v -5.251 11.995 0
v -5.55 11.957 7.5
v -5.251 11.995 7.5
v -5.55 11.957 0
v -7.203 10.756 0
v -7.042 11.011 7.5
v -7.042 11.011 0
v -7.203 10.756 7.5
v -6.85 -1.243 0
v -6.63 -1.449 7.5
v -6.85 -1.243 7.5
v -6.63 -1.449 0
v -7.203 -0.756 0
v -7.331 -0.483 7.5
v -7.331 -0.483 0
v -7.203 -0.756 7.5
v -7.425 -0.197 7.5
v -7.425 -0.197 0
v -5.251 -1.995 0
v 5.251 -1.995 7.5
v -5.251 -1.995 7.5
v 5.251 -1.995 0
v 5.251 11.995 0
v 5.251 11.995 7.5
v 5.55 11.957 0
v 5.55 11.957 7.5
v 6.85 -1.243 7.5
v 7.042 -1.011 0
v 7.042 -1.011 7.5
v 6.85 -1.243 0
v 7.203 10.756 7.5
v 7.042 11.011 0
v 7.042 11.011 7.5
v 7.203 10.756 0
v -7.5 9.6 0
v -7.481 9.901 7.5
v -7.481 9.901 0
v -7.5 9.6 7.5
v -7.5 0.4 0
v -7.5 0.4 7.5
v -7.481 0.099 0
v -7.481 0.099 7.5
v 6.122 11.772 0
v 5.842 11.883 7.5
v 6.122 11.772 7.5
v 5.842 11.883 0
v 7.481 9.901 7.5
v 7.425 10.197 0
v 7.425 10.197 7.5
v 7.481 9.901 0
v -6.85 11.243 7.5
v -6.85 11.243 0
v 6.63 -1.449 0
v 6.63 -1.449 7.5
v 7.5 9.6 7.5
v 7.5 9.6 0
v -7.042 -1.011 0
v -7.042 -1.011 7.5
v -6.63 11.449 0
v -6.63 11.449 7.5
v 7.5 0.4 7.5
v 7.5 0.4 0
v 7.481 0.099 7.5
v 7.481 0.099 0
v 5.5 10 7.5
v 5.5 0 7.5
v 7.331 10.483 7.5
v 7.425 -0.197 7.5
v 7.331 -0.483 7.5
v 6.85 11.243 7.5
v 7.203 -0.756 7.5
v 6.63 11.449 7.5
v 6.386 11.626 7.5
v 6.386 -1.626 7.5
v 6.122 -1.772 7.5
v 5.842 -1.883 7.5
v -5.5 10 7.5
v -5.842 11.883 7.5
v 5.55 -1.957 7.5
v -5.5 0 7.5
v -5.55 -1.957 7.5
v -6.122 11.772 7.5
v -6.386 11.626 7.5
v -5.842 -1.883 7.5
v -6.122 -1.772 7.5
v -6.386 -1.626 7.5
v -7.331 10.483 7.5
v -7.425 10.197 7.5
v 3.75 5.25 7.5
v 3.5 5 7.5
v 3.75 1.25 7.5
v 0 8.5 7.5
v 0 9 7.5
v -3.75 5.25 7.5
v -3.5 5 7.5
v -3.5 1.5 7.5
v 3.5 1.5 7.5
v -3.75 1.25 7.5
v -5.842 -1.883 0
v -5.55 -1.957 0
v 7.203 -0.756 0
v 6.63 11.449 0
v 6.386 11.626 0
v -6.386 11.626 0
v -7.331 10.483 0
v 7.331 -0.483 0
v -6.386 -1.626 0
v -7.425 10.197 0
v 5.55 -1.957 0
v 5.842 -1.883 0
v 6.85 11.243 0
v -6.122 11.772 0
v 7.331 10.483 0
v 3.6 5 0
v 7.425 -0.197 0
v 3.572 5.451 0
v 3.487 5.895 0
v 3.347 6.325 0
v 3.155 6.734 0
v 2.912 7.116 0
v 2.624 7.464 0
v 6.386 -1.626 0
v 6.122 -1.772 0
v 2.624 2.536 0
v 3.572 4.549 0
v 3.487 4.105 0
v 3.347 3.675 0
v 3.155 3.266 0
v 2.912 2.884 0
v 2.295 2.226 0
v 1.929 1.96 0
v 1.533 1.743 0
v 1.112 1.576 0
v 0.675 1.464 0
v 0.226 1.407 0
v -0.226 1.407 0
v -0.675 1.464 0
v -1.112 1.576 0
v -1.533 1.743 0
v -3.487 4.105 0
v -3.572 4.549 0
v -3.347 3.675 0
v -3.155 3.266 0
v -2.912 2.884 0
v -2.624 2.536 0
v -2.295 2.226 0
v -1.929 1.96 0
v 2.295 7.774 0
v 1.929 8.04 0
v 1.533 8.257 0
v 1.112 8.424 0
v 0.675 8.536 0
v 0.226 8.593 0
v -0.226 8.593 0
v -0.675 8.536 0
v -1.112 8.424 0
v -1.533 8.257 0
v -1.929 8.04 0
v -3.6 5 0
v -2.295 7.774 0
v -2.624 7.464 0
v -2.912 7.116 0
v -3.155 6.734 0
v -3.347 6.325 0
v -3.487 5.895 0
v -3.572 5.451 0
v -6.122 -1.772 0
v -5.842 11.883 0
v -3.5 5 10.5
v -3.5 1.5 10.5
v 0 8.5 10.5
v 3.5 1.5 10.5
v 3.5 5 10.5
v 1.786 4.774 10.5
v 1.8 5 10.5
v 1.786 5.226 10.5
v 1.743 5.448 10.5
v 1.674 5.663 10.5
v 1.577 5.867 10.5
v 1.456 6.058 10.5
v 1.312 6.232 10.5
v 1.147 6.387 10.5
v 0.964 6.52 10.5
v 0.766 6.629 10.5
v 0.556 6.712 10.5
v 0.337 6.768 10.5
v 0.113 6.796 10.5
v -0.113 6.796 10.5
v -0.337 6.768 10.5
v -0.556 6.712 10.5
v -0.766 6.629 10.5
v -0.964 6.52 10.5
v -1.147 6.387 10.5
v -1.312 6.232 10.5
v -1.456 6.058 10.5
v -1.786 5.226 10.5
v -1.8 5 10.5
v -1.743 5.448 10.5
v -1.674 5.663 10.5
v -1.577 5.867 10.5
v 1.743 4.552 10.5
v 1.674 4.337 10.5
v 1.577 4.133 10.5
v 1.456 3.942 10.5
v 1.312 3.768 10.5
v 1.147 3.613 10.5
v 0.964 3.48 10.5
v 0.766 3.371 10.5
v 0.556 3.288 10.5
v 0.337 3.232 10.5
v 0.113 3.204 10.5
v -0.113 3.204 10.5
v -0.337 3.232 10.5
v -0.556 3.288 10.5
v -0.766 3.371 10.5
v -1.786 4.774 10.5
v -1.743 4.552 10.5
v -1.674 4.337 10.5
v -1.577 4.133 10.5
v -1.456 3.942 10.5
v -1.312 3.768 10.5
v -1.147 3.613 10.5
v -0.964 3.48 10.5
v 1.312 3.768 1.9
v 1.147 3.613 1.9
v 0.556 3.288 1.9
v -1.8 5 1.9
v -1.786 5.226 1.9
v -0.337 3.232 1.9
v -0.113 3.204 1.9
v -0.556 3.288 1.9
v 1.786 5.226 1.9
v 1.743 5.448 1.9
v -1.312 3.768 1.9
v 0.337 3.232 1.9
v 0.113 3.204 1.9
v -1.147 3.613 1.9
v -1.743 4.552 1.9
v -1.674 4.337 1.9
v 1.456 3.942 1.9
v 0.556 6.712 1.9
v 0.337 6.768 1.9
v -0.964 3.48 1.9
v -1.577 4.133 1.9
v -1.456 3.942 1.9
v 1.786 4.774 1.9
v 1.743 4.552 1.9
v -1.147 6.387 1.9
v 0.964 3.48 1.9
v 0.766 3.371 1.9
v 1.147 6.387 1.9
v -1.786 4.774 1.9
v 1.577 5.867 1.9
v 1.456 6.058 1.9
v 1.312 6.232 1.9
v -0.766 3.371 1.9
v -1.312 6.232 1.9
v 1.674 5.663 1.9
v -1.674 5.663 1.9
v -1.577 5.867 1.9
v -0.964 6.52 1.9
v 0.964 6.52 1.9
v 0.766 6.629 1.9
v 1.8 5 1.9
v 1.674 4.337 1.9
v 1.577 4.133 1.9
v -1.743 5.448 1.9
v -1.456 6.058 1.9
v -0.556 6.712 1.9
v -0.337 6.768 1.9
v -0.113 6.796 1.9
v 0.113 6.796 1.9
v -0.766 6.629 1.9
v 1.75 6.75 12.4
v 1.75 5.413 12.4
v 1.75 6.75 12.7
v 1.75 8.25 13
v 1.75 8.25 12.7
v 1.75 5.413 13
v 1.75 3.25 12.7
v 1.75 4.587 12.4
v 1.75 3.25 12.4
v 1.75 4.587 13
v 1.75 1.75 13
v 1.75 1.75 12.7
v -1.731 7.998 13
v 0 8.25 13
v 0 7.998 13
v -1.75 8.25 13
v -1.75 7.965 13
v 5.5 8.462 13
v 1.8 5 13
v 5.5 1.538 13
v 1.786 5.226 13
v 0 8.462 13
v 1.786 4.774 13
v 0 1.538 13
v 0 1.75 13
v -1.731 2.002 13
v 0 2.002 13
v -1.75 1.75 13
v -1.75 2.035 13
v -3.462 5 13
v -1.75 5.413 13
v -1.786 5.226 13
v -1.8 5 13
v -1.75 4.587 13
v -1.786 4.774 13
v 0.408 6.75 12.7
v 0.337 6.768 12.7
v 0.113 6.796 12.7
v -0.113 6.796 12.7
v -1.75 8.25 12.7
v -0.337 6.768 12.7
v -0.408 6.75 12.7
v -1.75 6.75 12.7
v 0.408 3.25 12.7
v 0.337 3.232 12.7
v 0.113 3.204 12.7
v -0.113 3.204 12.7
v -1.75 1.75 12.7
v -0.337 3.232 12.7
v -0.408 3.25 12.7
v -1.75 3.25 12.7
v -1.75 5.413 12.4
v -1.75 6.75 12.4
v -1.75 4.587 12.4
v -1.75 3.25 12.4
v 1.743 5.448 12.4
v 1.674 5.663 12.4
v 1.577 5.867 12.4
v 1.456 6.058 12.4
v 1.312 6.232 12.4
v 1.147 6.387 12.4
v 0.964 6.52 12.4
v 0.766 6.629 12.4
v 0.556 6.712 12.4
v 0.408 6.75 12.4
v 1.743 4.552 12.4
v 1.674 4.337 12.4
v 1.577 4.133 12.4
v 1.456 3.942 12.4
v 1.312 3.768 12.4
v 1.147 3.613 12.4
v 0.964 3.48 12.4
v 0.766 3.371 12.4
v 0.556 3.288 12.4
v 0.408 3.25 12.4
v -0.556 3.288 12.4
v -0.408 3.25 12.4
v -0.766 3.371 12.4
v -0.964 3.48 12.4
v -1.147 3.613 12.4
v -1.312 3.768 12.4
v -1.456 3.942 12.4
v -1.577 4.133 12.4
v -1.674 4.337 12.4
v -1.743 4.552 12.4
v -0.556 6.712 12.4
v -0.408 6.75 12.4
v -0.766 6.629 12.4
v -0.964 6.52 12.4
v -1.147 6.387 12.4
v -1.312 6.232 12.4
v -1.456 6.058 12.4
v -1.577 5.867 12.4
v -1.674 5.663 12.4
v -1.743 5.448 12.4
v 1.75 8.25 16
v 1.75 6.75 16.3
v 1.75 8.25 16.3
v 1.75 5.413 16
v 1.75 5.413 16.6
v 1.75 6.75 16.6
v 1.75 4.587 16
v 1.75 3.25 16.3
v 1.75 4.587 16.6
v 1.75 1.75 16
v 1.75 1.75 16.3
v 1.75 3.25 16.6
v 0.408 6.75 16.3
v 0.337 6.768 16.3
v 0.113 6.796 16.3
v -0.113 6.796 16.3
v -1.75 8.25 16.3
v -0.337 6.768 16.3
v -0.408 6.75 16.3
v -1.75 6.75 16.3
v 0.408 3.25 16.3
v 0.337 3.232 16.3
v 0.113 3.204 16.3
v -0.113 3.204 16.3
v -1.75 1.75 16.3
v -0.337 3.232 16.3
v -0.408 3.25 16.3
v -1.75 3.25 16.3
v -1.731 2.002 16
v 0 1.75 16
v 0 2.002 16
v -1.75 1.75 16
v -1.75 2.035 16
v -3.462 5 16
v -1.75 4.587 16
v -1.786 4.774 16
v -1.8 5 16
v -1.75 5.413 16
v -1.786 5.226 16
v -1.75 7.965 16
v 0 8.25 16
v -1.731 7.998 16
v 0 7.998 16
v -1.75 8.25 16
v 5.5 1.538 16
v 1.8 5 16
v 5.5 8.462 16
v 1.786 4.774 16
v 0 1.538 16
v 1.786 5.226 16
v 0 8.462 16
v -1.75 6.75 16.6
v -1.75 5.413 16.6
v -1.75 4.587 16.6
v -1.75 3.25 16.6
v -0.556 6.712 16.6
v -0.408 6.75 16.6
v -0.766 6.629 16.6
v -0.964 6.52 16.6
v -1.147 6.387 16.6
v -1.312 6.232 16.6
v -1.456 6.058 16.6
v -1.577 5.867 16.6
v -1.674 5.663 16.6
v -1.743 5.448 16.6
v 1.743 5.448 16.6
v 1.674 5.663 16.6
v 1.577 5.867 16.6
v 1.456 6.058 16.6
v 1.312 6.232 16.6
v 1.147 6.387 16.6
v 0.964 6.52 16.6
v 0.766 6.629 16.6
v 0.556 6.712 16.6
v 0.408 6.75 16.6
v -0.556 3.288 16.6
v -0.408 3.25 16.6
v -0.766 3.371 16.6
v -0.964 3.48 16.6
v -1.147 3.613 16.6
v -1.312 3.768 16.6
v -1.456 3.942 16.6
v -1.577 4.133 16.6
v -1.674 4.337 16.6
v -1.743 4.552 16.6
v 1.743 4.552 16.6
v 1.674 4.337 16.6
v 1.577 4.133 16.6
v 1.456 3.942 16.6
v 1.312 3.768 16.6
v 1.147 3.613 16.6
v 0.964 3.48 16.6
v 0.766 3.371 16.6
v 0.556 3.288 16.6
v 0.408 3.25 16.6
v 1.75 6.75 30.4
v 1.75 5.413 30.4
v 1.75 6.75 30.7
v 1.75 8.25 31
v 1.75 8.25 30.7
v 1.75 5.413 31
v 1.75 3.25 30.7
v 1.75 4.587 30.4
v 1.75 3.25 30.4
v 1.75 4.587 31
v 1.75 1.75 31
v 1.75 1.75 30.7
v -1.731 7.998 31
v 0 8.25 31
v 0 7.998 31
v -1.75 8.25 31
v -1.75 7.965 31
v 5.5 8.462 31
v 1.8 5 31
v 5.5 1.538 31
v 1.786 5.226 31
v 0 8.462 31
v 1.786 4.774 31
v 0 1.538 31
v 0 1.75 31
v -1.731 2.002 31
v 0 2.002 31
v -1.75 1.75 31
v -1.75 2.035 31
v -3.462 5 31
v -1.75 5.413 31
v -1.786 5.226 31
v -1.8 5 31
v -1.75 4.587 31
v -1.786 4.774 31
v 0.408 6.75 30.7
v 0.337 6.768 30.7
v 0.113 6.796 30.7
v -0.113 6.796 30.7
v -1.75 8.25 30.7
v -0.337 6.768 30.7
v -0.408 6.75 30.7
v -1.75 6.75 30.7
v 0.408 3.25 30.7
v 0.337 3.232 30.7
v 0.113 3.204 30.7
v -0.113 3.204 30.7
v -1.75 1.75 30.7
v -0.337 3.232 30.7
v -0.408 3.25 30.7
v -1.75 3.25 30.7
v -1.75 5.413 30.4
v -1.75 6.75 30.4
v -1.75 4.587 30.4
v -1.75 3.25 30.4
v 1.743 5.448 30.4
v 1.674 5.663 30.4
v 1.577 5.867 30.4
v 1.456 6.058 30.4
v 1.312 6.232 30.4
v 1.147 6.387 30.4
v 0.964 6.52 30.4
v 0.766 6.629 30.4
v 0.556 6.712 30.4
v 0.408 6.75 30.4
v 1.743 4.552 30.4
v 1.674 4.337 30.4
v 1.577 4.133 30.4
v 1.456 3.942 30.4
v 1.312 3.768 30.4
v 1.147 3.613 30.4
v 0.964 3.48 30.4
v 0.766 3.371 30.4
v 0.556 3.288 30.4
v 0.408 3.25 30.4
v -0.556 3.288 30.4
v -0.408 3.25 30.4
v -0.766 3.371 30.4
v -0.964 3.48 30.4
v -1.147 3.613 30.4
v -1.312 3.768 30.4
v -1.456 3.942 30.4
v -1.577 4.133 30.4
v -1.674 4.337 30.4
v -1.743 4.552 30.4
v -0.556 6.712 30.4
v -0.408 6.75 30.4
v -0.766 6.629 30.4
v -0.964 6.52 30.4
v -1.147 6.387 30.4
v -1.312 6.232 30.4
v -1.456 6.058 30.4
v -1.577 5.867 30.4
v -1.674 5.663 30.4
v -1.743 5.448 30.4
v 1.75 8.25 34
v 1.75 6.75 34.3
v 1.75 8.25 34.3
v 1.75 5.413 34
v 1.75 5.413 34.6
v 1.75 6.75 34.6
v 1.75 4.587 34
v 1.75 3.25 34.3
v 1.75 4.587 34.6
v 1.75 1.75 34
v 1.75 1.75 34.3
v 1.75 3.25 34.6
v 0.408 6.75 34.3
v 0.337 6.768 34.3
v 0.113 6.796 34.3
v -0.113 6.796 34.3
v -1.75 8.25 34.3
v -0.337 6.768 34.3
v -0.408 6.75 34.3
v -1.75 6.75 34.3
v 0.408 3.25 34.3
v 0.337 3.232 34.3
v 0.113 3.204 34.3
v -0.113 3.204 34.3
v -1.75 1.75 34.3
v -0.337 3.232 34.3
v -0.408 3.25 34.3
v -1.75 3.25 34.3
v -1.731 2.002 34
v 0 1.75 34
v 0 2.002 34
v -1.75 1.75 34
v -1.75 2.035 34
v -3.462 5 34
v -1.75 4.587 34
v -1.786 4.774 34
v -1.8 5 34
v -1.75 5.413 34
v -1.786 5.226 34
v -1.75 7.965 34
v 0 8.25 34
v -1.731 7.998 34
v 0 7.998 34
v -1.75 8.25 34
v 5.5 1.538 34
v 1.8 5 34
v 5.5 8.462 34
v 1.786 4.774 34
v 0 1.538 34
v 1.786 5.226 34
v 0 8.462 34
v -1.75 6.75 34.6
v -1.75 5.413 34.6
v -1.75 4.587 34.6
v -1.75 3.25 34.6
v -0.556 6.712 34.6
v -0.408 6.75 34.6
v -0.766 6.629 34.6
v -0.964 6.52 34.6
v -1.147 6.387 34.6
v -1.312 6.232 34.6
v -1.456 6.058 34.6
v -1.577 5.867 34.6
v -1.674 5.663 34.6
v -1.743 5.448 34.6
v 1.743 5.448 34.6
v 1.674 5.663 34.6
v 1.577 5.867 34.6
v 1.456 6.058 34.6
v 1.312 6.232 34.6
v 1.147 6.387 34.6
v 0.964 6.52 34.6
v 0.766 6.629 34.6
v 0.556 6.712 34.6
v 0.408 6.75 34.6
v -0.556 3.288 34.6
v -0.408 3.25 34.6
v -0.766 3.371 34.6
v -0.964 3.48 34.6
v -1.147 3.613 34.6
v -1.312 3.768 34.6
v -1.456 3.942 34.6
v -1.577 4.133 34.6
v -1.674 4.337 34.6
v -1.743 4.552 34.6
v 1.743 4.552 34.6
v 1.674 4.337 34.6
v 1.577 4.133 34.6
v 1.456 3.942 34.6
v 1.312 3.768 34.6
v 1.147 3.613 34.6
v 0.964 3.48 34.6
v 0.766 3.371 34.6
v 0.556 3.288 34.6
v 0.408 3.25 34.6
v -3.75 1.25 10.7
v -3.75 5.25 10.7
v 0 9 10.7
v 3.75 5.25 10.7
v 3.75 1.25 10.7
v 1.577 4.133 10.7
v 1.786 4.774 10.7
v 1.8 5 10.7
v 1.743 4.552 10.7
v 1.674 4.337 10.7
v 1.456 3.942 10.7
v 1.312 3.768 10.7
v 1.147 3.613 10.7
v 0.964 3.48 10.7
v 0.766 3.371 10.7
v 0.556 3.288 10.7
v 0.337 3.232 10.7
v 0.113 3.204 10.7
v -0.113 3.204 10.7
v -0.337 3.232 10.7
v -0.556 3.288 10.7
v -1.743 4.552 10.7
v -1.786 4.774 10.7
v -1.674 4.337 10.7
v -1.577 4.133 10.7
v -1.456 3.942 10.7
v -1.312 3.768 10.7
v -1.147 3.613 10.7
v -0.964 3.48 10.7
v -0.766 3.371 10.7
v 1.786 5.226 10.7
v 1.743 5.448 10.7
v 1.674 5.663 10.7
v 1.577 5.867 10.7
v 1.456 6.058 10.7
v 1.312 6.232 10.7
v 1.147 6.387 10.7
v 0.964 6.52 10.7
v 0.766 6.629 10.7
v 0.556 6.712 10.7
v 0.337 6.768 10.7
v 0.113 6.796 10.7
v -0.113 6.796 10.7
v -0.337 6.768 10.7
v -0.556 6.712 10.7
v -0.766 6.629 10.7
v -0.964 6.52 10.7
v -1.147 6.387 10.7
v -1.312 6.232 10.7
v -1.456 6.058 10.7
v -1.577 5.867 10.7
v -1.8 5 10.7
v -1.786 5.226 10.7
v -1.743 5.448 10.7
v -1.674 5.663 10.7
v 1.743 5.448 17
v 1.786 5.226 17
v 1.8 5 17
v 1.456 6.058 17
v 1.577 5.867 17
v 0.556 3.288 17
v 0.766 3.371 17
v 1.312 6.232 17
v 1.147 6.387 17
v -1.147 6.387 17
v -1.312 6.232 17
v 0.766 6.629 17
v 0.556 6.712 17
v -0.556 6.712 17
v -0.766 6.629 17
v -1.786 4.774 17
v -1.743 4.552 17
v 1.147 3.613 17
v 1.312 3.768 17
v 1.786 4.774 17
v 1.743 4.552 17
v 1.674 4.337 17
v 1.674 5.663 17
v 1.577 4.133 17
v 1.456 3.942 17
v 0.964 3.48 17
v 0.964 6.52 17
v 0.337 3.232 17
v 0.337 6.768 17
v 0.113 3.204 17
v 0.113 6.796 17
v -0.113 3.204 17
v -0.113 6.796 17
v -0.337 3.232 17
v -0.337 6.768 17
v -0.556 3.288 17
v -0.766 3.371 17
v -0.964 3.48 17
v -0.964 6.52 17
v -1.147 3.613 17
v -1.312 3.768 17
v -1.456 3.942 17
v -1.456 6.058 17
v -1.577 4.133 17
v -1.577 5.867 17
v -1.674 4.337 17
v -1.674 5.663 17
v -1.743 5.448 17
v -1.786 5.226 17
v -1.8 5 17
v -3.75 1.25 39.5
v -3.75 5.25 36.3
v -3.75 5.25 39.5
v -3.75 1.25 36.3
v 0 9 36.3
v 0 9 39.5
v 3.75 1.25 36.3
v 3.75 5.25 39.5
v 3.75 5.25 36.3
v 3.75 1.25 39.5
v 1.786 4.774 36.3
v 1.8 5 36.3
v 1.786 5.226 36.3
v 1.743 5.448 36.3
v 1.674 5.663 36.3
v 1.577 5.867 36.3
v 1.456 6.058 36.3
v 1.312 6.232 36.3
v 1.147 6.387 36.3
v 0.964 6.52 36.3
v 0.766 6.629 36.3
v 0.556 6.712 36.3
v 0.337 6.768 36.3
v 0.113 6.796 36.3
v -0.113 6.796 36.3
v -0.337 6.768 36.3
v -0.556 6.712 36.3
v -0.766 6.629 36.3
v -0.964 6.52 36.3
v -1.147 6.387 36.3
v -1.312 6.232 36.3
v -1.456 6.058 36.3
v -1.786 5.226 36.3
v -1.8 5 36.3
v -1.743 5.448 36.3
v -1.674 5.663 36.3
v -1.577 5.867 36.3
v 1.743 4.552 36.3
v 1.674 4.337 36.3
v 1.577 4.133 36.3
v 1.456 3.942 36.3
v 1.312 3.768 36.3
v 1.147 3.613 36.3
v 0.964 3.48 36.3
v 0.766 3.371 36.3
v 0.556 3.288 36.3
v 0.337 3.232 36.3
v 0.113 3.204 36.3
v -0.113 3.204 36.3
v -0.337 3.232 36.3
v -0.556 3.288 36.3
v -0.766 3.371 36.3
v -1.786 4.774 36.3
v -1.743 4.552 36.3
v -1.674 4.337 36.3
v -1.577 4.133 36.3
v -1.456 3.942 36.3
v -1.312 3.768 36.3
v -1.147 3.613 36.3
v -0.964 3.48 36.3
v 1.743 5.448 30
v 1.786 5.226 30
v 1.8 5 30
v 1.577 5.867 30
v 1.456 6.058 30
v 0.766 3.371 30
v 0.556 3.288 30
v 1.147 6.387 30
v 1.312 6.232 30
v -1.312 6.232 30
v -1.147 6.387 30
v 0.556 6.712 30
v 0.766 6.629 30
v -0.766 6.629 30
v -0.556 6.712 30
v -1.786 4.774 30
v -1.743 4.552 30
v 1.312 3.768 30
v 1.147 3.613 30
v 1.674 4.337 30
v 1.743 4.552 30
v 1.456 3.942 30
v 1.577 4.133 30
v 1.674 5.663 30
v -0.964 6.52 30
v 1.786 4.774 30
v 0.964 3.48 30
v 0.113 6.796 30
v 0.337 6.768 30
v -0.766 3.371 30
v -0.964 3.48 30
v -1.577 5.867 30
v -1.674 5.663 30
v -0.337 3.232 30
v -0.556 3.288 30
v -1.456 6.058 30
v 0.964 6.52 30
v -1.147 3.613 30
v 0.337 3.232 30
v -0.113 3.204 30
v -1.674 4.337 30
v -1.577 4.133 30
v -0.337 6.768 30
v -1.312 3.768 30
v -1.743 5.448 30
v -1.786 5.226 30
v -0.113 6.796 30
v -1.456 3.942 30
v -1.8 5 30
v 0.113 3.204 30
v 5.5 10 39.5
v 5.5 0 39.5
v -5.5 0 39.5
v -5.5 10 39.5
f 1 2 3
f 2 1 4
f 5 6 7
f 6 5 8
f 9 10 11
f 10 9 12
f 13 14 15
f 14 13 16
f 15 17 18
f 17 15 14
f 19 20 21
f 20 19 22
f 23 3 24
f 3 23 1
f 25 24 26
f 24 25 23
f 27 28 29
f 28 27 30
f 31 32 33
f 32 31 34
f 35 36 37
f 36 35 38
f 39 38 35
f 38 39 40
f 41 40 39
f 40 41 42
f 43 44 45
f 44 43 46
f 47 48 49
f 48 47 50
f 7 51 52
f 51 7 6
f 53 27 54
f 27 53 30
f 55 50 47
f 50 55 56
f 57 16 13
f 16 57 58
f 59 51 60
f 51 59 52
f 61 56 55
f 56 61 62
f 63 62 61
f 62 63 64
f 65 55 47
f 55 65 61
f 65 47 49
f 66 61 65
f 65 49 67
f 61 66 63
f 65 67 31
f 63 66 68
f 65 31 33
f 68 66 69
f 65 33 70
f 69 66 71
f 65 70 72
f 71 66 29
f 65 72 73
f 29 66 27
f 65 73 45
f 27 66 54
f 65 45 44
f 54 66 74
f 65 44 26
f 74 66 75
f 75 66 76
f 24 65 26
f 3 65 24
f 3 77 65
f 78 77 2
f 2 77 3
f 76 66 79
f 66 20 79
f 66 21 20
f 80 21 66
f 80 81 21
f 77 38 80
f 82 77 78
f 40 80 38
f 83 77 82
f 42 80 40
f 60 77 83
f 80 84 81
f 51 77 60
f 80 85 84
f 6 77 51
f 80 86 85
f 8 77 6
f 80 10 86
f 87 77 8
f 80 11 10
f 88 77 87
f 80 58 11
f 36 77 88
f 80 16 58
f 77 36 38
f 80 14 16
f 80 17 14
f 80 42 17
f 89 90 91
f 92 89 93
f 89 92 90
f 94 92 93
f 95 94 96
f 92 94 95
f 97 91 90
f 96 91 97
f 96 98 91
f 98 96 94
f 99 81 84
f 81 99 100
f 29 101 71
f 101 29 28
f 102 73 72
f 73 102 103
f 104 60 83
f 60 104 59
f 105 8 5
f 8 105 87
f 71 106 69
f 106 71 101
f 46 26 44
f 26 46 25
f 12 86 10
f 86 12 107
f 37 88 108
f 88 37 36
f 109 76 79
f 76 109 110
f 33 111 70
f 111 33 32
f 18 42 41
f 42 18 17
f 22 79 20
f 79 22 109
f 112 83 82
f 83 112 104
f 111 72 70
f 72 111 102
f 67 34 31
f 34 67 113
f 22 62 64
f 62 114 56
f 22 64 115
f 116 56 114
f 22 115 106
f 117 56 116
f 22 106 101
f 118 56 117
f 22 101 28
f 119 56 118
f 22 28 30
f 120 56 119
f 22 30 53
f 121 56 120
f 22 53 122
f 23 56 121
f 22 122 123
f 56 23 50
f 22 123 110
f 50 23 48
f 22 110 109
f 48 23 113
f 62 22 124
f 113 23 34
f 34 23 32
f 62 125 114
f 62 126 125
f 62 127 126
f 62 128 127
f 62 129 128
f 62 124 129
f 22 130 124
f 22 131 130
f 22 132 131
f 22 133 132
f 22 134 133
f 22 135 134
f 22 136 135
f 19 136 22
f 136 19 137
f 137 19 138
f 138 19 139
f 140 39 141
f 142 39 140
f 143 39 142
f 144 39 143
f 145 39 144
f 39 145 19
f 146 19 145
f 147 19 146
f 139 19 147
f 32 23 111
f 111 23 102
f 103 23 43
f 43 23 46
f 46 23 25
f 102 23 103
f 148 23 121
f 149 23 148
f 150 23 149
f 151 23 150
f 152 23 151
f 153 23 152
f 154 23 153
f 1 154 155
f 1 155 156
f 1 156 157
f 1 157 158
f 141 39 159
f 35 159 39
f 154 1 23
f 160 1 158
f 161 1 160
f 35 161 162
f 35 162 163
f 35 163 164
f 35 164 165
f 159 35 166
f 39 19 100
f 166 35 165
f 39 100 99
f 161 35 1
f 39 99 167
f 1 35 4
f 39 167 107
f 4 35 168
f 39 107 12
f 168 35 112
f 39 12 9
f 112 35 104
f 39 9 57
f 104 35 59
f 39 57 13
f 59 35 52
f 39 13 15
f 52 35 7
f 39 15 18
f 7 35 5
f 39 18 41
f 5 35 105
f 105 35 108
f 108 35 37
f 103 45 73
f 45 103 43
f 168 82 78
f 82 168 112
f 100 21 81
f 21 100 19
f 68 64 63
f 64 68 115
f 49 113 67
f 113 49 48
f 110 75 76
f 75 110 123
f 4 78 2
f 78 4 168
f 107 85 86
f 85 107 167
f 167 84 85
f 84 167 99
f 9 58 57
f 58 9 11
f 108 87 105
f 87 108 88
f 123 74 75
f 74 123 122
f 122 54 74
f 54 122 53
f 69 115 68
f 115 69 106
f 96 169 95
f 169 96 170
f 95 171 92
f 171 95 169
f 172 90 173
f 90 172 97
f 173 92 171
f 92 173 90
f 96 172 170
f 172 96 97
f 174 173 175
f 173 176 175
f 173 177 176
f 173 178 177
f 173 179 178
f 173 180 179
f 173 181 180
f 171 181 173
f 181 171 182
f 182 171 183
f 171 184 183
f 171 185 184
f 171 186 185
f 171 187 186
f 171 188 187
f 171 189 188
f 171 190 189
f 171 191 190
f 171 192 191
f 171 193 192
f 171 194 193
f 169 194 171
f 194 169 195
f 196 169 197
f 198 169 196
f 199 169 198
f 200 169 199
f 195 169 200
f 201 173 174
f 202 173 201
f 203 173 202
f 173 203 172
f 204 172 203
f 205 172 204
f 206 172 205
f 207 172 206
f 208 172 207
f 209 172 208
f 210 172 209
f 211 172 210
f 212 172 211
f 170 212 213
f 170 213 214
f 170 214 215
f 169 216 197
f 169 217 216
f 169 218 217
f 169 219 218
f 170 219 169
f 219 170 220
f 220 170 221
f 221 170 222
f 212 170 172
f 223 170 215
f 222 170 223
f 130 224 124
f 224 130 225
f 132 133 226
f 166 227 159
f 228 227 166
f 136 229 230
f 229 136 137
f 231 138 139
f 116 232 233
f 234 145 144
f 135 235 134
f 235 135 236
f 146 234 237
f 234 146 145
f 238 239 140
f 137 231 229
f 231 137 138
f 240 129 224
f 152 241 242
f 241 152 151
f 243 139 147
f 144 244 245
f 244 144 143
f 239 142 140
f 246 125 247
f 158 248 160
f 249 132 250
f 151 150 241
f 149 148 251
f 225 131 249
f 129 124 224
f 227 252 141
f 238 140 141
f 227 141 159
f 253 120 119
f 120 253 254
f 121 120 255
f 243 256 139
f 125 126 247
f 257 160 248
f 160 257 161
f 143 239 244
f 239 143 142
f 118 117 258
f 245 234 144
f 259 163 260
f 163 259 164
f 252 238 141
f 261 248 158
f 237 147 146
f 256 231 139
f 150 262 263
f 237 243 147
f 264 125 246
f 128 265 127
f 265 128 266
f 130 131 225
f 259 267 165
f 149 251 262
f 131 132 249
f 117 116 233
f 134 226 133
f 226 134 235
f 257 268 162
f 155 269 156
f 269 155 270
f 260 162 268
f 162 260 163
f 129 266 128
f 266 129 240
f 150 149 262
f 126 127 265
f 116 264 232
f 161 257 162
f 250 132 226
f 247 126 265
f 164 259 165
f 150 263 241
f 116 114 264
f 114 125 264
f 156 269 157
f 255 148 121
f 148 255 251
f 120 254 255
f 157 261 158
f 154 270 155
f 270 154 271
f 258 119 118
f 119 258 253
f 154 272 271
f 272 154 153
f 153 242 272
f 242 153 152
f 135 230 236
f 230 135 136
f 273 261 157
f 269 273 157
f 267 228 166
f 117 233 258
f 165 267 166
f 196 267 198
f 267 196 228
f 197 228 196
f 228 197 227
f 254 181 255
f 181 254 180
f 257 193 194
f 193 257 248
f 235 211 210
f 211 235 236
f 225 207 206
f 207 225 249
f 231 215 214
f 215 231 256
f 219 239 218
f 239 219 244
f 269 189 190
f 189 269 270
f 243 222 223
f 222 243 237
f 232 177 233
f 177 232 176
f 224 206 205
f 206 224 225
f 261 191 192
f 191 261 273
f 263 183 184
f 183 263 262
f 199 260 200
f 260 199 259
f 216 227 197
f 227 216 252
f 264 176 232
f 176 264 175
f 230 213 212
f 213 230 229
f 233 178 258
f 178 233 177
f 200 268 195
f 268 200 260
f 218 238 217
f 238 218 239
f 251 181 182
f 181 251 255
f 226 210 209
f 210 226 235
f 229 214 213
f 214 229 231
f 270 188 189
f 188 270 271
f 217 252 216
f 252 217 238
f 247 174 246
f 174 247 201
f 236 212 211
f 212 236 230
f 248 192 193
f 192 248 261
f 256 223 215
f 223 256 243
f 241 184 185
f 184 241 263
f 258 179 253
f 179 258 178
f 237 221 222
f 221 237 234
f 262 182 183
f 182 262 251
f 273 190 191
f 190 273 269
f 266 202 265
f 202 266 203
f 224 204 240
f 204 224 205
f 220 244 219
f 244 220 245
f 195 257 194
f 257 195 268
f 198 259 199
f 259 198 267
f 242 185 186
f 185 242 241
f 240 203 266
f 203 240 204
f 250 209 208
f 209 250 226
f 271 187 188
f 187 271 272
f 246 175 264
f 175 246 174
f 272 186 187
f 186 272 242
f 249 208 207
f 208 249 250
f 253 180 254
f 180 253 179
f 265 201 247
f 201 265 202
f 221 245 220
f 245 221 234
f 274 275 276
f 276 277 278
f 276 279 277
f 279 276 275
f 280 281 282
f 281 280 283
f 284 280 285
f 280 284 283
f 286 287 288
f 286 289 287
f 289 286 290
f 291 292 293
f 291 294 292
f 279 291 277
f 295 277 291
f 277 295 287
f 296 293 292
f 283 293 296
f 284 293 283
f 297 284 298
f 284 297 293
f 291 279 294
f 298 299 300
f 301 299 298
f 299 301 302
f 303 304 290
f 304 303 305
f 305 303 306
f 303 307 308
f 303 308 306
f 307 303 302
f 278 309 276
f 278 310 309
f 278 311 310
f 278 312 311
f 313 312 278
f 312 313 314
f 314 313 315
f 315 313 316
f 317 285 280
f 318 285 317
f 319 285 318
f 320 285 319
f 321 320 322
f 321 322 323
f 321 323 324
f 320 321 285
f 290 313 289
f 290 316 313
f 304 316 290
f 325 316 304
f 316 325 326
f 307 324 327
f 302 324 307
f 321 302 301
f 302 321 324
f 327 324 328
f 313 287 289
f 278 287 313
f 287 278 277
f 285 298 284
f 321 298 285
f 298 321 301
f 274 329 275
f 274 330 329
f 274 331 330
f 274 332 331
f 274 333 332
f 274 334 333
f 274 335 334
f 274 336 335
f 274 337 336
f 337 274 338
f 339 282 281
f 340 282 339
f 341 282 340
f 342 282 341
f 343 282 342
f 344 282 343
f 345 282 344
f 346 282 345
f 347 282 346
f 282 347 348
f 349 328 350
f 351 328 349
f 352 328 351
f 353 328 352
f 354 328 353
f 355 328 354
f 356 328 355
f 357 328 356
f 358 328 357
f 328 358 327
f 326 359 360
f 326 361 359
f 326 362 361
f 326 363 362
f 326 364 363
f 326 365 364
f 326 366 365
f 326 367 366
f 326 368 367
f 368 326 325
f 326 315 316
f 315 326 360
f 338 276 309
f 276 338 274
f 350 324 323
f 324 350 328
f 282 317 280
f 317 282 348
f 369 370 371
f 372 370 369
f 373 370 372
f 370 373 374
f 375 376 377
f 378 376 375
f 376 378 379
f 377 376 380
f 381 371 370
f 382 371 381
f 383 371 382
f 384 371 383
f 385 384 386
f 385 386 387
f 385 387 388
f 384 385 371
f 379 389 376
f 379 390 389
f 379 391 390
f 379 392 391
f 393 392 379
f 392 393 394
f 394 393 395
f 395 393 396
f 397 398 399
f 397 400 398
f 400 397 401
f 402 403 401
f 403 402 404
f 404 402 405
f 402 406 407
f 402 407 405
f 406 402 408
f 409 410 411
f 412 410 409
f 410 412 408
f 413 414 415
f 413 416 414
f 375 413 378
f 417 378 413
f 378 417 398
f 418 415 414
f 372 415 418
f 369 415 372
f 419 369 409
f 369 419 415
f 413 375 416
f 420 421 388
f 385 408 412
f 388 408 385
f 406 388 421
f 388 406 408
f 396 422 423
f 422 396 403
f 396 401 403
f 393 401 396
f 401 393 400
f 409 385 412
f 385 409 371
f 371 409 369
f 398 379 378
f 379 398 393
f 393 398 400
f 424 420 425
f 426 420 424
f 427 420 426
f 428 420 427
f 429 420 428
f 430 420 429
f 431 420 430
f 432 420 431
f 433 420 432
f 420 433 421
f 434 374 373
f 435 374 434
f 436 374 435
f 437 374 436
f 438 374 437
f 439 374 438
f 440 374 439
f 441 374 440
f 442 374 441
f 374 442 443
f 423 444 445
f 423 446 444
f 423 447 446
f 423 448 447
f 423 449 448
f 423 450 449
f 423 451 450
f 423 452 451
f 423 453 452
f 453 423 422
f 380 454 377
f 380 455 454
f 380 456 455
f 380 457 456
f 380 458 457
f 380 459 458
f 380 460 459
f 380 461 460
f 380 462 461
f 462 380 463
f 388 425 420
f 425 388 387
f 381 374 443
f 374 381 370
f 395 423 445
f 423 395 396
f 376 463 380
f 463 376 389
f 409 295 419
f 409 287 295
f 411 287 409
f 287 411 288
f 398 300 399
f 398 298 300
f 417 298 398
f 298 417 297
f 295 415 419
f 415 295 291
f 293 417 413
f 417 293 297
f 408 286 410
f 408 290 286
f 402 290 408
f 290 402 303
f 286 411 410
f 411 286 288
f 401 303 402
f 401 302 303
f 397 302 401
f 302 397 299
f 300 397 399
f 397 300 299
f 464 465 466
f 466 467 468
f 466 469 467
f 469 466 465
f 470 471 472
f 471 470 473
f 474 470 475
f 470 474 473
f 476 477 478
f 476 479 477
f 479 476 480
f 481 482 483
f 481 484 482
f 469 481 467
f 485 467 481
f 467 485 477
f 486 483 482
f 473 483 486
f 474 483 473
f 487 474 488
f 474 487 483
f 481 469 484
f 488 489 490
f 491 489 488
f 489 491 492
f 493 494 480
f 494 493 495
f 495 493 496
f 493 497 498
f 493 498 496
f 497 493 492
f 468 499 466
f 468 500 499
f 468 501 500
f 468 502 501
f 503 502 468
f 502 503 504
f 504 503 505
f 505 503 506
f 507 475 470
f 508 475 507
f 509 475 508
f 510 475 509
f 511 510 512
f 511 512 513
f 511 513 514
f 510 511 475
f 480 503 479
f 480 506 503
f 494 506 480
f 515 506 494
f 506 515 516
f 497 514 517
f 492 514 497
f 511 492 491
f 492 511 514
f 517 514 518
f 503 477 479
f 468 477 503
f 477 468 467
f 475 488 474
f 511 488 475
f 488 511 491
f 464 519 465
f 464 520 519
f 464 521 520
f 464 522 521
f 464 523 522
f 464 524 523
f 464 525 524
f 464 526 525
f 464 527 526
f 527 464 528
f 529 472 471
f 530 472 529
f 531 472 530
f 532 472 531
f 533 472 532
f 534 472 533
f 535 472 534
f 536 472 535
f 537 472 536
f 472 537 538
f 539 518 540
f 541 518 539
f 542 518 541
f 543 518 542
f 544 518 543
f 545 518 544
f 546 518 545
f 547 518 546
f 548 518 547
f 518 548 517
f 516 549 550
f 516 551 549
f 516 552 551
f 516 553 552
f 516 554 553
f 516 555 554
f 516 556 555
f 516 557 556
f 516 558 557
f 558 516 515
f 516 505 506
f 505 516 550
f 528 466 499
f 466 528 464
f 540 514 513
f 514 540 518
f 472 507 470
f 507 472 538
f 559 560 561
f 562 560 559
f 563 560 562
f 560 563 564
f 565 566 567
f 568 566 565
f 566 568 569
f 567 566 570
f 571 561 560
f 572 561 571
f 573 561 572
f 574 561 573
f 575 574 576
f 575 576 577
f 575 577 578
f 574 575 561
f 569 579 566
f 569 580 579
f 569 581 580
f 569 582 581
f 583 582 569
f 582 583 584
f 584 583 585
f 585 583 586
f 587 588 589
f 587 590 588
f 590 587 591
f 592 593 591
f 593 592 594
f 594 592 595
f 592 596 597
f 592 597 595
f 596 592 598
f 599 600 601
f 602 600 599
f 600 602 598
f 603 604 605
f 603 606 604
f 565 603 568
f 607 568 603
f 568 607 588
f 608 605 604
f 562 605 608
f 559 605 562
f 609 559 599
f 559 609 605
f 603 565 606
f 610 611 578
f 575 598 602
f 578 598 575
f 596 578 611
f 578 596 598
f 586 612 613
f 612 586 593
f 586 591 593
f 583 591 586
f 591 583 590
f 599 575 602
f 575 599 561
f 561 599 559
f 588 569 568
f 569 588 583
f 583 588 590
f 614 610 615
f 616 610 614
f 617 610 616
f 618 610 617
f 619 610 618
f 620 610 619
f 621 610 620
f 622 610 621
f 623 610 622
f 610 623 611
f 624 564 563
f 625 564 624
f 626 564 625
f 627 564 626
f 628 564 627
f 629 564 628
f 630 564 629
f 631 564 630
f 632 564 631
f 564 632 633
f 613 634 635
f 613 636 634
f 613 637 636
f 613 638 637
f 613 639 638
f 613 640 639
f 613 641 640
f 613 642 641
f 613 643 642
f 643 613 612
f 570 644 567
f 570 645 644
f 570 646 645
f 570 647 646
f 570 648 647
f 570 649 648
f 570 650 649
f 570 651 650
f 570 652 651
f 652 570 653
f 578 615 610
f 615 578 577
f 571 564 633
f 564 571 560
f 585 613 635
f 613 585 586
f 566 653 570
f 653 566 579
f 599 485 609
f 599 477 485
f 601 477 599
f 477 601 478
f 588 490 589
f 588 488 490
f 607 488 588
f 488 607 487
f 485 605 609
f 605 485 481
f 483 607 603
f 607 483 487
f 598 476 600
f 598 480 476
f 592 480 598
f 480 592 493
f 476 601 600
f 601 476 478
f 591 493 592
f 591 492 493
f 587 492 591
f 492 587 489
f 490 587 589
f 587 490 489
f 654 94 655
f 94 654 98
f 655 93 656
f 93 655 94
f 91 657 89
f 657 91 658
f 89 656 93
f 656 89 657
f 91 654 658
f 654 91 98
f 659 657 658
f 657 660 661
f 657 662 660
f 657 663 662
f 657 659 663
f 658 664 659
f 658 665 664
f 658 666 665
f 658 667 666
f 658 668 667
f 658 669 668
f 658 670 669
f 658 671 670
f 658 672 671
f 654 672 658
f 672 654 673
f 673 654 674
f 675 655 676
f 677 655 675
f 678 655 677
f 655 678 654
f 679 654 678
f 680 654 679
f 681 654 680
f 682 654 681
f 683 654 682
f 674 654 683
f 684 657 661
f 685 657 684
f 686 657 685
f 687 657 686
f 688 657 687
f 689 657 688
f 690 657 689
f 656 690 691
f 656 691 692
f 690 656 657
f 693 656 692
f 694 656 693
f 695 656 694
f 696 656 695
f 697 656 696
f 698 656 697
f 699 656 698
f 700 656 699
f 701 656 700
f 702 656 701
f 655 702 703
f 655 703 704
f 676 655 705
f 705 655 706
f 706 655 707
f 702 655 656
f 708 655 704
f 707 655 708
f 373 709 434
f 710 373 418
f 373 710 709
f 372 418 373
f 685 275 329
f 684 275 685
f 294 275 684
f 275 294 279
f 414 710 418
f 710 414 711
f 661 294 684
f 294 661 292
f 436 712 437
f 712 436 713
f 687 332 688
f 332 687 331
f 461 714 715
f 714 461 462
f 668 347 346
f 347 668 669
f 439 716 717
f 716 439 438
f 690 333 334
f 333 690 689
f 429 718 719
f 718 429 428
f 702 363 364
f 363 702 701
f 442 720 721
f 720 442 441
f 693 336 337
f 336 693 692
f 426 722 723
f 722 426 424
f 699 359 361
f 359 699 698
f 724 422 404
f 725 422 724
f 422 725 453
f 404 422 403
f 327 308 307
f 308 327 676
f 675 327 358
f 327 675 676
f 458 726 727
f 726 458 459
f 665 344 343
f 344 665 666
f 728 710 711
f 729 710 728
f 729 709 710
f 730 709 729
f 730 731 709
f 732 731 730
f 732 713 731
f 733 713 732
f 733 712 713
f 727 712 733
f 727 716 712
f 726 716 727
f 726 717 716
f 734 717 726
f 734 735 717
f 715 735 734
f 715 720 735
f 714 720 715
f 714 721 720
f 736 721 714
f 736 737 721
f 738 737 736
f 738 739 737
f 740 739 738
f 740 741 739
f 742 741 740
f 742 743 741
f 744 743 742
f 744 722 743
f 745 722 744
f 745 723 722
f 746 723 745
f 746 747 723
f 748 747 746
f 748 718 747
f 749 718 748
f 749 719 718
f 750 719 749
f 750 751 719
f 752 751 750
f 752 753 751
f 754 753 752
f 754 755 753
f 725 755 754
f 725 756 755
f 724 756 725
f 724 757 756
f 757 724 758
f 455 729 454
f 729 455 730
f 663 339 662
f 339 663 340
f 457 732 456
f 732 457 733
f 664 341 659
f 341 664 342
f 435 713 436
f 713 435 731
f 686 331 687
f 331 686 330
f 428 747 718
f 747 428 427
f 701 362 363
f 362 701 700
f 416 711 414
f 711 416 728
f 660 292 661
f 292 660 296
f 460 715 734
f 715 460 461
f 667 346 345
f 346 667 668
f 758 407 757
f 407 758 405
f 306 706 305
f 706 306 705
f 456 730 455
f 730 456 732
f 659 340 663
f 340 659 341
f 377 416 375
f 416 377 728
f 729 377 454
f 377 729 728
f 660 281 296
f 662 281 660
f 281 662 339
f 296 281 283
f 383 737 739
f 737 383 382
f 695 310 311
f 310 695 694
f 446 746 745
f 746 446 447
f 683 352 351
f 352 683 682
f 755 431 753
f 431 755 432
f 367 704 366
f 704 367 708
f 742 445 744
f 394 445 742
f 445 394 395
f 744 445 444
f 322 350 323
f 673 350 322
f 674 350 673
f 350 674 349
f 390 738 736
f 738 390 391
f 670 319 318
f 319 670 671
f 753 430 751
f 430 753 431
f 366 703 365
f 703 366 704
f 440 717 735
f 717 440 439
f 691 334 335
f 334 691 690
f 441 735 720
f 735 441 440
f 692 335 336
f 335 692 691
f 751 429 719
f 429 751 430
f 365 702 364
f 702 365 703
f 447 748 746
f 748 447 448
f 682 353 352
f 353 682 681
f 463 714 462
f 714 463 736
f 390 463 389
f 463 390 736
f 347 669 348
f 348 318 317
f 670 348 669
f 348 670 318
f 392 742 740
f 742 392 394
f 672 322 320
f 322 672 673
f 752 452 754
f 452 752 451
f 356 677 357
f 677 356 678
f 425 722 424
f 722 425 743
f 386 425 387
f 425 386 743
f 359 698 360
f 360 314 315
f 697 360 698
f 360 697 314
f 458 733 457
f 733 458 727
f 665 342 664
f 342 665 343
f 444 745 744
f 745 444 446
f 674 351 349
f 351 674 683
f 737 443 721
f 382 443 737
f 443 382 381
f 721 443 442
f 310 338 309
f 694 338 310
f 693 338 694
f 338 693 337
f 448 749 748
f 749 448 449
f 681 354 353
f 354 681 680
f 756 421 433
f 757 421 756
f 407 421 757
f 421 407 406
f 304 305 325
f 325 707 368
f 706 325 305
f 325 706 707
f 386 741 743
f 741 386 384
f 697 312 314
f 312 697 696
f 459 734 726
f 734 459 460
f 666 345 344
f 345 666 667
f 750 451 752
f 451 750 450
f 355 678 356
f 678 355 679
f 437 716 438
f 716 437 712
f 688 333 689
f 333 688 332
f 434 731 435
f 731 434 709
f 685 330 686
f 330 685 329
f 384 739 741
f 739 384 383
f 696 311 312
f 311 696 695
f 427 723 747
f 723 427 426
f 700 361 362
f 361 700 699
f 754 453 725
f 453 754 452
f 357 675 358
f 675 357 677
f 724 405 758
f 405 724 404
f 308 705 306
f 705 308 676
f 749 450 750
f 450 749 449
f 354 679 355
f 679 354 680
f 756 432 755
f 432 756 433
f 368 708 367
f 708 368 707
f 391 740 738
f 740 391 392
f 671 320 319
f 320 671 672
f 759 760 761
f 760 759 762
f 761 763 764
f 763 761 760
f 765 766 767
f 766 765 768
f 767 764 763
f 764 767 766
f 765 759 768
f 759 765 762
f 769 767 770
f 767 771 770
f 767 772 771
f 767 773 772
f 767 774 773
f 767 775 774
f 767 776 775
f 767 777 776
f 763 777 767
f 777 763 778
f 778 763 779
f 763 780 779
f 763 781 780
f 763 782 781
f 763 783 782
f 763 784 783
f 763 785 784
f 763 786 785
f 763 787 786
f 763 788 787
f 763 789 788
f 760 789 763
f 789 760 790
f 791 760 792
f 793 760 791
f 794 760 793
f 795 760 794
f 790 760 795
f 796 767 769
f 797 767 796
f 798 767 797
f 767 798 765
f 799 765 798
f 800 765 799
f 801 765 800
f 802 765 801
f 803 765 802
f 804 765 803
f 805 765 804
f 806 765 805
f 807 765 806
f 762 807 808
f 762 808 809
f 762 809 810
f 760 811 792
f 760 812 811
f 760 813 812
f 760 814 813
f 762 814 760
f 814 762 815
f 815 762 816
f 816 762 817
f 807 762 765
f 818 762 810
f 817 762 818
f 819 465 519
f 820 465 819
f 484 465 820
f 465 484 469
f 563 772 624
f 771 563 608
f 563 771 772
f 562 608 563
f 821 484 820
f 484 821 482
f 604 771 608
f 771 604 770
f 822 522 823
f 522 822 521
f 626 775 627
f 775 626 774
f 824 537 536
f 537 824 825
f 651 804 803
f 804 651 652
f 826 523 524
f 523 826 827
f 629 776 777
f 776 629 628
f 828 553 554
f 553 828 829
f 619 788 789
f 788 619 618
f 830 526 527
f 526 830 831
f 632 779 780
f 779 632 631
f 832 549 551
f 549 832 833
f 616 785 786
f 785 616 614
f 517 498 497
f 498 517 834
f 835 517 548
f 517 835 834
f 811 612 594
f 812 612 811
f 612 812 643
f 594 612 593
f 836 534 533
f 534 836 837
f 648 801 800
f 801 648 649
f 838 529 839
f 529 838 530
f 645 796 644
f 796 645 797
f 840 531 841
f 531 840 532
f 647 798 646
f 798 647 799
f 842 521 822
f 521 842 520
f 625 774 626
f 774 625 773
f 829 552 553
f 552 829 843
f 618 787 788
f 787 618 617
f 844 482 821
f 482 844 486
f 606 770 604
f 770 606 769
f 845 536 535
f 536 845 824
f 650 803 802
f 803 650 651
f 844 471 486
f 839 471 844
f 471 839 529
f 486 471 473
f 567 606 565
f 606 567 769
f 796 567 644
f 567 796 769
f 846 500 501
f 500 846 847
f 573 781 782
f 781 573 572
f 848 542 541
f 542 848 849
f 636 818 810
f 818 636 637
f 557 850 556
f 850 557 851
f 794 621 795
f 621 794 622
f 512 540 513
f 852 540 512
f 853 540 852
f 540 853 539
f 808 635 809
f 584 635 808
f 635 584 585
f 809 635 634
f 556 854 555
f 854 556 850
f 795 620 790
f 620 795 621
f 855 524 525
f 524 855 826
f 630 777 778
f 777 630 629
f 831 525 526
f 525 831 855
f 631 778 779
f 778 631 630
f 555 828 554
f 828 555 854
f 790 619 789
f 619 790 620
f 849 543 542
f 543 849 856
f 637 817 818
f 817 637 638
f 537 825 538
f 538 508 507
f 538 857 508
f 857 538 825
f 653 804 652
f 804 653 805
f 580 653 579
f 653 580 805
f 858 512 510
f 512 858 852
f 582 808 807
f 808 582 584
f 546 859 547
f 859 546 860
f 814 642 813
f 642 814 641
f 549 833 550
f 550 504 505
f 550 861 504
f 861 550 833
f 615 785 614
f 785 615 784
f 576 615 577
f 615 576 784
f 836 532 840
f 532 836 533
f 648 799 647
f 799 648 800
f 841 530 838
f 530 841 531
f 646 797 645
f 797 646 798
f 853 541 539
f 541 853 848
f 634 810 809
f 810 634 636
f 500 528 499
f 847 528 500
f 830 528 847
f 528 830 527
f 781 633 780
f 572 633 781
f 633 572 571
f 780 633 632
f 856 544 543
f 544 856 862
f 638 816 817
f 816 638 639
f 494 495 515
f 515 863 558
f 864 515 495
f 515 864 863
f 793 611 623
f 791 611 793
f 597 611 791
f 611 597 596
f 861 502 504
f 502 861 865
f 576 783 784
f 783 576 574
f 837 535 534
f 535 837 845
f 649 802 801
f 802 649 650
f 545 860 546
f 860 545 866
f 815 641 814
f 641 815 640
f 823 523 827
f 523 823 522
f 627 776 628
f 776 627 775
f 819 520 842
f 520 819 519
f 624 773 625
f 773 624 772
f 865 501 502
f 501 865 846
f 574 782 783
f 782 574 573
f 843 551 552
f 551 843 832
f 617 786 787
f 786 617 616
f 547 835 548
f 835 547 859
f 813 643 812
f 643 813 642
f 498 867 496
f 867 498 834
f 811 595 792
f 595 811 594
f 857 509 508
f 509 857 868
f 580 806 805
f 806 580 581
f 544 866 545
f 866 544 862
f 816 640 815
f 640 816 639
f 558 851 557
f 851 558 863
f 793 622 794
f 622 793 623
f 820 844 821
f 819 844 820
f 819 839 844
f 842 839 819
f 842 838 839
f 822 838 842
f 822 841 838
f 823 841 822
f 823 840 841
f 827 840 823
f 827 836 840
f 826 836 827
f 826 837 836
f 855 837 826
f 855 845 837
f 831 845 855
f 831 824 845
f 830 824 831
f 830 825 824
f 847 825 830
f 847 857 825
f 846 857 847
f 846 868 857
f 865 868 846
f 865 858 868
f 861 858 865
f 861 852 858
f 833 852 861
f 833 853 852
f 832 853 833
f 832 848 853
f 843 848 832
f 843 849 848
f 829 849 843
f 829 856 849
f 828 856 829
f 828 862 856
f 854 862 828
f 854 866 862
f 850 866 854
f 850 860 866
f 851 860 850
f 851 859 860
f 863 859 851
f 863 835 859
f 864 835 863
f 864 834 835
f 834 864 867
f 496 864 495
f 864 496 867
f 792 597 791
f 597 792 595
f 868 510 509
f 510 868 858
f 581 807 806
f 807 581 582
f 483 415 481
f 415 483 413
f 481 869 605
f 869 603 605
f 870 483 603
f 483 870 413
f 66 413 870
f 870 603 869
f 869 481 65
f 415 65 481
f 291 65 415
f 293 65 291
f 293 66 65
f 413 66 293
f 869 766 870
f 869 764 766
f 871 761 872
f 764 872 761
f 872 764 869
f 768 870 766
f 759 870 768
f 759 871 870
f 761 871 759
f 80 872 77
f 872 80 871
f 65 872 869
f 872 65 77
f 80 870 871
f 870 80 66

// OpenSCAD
$fn = 50;

difference() {
	union() {
		translate(v = [0, 5, 0]) {
			rotate(a = [0, 0, 0]) {
				difference() {
					union() {
						translate(v = [0, 0, 0]) {
							rotate(a = [0, 0, 0]) {
								difference() {
									union() {
										hull() {
											translate(v = [-5.1, 4.6, 0]) {
												cylinder(h = 7.5, r = 2.4);
											}
											translate(v = [5.1, 4.6, 0]) {
												cylinder(h = 7.5, r = 2.4);
											}
											translate(v = [-5.1, -4.6, 0]) {
												cylinder(h = 7.5, r = 2.4);
											}
											translate(v = [5.1, -4.6, 0]) {
												cylinder(h = 7.5, r = 2.4);
											}
										}
										translate(v = [0, -5, 7.4]) {
											linear_extrude(height = 3.1) {
												polygon(points = [[-3.5, 1.5], [3.5, 1.5], [3.5, 5], [0, 8.5], [-3.5, 5]]);
											}
										}
									}
									union() {
										translate(v = [0, 0.0, 0]) {
											rotate(a = [0, 180, 0]) {
												difference() {
													union() {
														translate(v = [0, 0, -16.0]) {
															cylinder(h = 16.0, r = 1.5);
														}
														translate(v = [0, 0, -1.9]) {
															cylinder(h = 1.9, r1 = 1.8, r2 = 3.6);
														}
														cylinder(h = 250, r = 3.6);
														translate(v = [0, 0, -16.0]) {
															cylinder(h = 16.0, r = 1.8);
														}
														translate(v = [0, 0, -16.0]) {
															cylinder(h = 16.0, r = 1.5);
														}
													}
													union();
												}
											}
										}
									}
								}
							}
						}
					}
					union();
				}
			}
		}
		translate(v = [0, 0, 23.5]) {
			rotate(a = [-90, 0, 0]) {
				difference() {
					union() {
						translate(v = [0, 16.0, 0]) {
							rotate(a = [90, 0, 0]) {
								difference() {
									union() {
										translate(v = [-5.5, 0, 0]) {
											cube(size = [11.0, 10.0, 32.0]);
										}
									}
									union() {
										translate(v = [0, 5.0, 5.5]) {
											rotate(a = [0, 0, 0]) {
												difference() {
													union() {
														translate(v = [-1.75, -3.25, -0.3]) {
															cube(size = [3.5, 6.5, 0.3]);
														}
														translate(v = [-1.75, -1.75, -0.6]) {
															cube(size = [3.5, 3.5, 0.3]);
														}
														translate(v = [-1.75, -3.25, 3]) {
															cube(size = [3.5, 6.5, 0.3]);
														}
														translate(v = [-1.75, -1.75, 3.3]) {
															cube(size = [3.5, 3.5, 0.3]);
														}
														translate(v = [0.0, -3.4619999999999997, 0]) {
															cube(size = [20, 6.9239999999999995, 3]);
														}
														linear_extrude(height = 3) {
															polygon(points = [[3.4619999999999997, 0.0], [1.7310000000000003, 2.9981799479017264], [-1.7309999999999992, 2.9981799479017264], [-3.4619999999999997, 4.2397272186481365e-16], [-1.7310000000000014, -2.998179947901726], [1.7309999999999977, -2.9981799479017277]]);
														}
														translate(v = [-1.75, -3.25, -0.3]) {
															cube(size = [3.5, 6.5, 0.3]);
														}
														translate(v = [-1.75, -1.75, -0.6]) {
															cube(size = [3.5, 3.5, 0.3]);
														}
														translate(v = [-1.75, -3.25, 3]) {
															cube(size = [3.5, 6.5, 0.3]);
														}
														translate(v = [-1.75, -1.75, 3.3]) {
															cube(size = [3.5, 3.5, 0.3]);
														}
														translate(v = [-1.75, -3.25, -0.3]) {
															cube(size = [3.5, 6.5, 0.3]);
														}
														translate(v = [-1.75, -1.75, -0.6]) {
															cube(size = [3.5, 3.5, 0.3]);
														}
														translate(v = [-1.75, -3.25, 3]) {
															cube(size = [3.5, 6.5, 0.3]);
														}
														translate(v = [-1.75, -1.75, 3.3]) {
															cube(size = [3.5, 3.5, 0.3]);
														}
													}
													union();
												}
											}
										}
										translate(v = [0, 5.0, 23.5]) {
											rotate(a = [0, 0, 0]) {
												difference() {
													union() {
														translate(v = [-1.75, -3.25, -0.3]) {
															cube(size = [3.5, 6.5, 0.3]);
														}
														translate(v = [-1.75, -1.75, -0.6]) {
															cube(size = [3.5, 3.5, 0.3]);
														}
														translate(v = [-1.75, -3.25, 3]) {
															cube(size = [3.5, 6.5, 0.3]);
														}
														translate(v = [-1.75, -1.75, 3.3]) {
															cube(size = [3.5, 3.5, 0.3]);
														}
														translate(v = [0.0, -3.4619999999999997, 0]) {
															cube(size = [20, 6.9239999999999995, 3]);
														}
														linear_extrude(height = 3) {
															polygon(points = [[3.4619999999999997, 0.0], [1.7310000000000003, 2.9981799479017264], [-1.7309999999999992, 2.9981799479017264], [-3.4619999999999997, 4.2397272186481365e-16], [-1.7310000000000014, -2.998179947901726], [1.7309999999999977, -2.9981799479017277]]);
														}
														translate(v = [-1.75, -3.25, -0.3]) {
															cube(size = [3.5, 6.5, 0.3]);
														}
														translate(v = [-1.75, -1.75, -0.6]) {
															cube(size = [3.5, 3.5, 0.3]);
														}
														translate(v = [-1.75, -3.25, 3]) {
															cube(size = [3.5, 6.5, 0.3]);
														}
														translate(v = [-1.75, -1.75, 3.3]) {
															cube(size = [3.5, 3.5, 0.3]);
														}
														translate(v = [-1.75, -3.25, -0.3]) {
															cube(size = [3.5, 6.5, 0.3]);
														}
														translate(v = [-1.75, -1.75, -0.6]) {
															cube(size = [3.5, 3.5, 0.3]);
														}
														translate(v = [-1.75, -3.25, 3]) {
															cube(size = [3.5, 6.5, 0.3]);
														}
														translate(v = [-1.75, -1.75, 3.3]) {
															cube(size = [3.5, 3.5, 0.3]);
														}
													}
													union();
												}
											}
										}
										translate(v = [0, 0, -0.1]) {
											linear_extrude(height = 3.3000000000000003) {
												polygon(points = [[-3.75, 1.25], [3.75, 1.25], [3.75, 5.25], [0, 9.0], [-3.75, 5.25]]);
											}
										}
										translate(v = [0, 5.0, -0.1]) {
											cylinder(h = 9.6, r = 1.8);
										}
										translate(v = [0, 0, 28.8]) {
											linear_extrude(height = 3.3000000000000003) {
												polygon(points = [[-3.75, 1.25], [3.75, 1.25], [3.75, 5.25], [0, 9.0], [-3.75, 5.25]]);
											}
										}
										translate(v = [0, 5.0, 22.5]) {
											cylinder(h = 9.6, r = 1.8);
										}
									}
								}
							}
						}
					}
					union();
				}
			}
		}
	}
	union();
}
